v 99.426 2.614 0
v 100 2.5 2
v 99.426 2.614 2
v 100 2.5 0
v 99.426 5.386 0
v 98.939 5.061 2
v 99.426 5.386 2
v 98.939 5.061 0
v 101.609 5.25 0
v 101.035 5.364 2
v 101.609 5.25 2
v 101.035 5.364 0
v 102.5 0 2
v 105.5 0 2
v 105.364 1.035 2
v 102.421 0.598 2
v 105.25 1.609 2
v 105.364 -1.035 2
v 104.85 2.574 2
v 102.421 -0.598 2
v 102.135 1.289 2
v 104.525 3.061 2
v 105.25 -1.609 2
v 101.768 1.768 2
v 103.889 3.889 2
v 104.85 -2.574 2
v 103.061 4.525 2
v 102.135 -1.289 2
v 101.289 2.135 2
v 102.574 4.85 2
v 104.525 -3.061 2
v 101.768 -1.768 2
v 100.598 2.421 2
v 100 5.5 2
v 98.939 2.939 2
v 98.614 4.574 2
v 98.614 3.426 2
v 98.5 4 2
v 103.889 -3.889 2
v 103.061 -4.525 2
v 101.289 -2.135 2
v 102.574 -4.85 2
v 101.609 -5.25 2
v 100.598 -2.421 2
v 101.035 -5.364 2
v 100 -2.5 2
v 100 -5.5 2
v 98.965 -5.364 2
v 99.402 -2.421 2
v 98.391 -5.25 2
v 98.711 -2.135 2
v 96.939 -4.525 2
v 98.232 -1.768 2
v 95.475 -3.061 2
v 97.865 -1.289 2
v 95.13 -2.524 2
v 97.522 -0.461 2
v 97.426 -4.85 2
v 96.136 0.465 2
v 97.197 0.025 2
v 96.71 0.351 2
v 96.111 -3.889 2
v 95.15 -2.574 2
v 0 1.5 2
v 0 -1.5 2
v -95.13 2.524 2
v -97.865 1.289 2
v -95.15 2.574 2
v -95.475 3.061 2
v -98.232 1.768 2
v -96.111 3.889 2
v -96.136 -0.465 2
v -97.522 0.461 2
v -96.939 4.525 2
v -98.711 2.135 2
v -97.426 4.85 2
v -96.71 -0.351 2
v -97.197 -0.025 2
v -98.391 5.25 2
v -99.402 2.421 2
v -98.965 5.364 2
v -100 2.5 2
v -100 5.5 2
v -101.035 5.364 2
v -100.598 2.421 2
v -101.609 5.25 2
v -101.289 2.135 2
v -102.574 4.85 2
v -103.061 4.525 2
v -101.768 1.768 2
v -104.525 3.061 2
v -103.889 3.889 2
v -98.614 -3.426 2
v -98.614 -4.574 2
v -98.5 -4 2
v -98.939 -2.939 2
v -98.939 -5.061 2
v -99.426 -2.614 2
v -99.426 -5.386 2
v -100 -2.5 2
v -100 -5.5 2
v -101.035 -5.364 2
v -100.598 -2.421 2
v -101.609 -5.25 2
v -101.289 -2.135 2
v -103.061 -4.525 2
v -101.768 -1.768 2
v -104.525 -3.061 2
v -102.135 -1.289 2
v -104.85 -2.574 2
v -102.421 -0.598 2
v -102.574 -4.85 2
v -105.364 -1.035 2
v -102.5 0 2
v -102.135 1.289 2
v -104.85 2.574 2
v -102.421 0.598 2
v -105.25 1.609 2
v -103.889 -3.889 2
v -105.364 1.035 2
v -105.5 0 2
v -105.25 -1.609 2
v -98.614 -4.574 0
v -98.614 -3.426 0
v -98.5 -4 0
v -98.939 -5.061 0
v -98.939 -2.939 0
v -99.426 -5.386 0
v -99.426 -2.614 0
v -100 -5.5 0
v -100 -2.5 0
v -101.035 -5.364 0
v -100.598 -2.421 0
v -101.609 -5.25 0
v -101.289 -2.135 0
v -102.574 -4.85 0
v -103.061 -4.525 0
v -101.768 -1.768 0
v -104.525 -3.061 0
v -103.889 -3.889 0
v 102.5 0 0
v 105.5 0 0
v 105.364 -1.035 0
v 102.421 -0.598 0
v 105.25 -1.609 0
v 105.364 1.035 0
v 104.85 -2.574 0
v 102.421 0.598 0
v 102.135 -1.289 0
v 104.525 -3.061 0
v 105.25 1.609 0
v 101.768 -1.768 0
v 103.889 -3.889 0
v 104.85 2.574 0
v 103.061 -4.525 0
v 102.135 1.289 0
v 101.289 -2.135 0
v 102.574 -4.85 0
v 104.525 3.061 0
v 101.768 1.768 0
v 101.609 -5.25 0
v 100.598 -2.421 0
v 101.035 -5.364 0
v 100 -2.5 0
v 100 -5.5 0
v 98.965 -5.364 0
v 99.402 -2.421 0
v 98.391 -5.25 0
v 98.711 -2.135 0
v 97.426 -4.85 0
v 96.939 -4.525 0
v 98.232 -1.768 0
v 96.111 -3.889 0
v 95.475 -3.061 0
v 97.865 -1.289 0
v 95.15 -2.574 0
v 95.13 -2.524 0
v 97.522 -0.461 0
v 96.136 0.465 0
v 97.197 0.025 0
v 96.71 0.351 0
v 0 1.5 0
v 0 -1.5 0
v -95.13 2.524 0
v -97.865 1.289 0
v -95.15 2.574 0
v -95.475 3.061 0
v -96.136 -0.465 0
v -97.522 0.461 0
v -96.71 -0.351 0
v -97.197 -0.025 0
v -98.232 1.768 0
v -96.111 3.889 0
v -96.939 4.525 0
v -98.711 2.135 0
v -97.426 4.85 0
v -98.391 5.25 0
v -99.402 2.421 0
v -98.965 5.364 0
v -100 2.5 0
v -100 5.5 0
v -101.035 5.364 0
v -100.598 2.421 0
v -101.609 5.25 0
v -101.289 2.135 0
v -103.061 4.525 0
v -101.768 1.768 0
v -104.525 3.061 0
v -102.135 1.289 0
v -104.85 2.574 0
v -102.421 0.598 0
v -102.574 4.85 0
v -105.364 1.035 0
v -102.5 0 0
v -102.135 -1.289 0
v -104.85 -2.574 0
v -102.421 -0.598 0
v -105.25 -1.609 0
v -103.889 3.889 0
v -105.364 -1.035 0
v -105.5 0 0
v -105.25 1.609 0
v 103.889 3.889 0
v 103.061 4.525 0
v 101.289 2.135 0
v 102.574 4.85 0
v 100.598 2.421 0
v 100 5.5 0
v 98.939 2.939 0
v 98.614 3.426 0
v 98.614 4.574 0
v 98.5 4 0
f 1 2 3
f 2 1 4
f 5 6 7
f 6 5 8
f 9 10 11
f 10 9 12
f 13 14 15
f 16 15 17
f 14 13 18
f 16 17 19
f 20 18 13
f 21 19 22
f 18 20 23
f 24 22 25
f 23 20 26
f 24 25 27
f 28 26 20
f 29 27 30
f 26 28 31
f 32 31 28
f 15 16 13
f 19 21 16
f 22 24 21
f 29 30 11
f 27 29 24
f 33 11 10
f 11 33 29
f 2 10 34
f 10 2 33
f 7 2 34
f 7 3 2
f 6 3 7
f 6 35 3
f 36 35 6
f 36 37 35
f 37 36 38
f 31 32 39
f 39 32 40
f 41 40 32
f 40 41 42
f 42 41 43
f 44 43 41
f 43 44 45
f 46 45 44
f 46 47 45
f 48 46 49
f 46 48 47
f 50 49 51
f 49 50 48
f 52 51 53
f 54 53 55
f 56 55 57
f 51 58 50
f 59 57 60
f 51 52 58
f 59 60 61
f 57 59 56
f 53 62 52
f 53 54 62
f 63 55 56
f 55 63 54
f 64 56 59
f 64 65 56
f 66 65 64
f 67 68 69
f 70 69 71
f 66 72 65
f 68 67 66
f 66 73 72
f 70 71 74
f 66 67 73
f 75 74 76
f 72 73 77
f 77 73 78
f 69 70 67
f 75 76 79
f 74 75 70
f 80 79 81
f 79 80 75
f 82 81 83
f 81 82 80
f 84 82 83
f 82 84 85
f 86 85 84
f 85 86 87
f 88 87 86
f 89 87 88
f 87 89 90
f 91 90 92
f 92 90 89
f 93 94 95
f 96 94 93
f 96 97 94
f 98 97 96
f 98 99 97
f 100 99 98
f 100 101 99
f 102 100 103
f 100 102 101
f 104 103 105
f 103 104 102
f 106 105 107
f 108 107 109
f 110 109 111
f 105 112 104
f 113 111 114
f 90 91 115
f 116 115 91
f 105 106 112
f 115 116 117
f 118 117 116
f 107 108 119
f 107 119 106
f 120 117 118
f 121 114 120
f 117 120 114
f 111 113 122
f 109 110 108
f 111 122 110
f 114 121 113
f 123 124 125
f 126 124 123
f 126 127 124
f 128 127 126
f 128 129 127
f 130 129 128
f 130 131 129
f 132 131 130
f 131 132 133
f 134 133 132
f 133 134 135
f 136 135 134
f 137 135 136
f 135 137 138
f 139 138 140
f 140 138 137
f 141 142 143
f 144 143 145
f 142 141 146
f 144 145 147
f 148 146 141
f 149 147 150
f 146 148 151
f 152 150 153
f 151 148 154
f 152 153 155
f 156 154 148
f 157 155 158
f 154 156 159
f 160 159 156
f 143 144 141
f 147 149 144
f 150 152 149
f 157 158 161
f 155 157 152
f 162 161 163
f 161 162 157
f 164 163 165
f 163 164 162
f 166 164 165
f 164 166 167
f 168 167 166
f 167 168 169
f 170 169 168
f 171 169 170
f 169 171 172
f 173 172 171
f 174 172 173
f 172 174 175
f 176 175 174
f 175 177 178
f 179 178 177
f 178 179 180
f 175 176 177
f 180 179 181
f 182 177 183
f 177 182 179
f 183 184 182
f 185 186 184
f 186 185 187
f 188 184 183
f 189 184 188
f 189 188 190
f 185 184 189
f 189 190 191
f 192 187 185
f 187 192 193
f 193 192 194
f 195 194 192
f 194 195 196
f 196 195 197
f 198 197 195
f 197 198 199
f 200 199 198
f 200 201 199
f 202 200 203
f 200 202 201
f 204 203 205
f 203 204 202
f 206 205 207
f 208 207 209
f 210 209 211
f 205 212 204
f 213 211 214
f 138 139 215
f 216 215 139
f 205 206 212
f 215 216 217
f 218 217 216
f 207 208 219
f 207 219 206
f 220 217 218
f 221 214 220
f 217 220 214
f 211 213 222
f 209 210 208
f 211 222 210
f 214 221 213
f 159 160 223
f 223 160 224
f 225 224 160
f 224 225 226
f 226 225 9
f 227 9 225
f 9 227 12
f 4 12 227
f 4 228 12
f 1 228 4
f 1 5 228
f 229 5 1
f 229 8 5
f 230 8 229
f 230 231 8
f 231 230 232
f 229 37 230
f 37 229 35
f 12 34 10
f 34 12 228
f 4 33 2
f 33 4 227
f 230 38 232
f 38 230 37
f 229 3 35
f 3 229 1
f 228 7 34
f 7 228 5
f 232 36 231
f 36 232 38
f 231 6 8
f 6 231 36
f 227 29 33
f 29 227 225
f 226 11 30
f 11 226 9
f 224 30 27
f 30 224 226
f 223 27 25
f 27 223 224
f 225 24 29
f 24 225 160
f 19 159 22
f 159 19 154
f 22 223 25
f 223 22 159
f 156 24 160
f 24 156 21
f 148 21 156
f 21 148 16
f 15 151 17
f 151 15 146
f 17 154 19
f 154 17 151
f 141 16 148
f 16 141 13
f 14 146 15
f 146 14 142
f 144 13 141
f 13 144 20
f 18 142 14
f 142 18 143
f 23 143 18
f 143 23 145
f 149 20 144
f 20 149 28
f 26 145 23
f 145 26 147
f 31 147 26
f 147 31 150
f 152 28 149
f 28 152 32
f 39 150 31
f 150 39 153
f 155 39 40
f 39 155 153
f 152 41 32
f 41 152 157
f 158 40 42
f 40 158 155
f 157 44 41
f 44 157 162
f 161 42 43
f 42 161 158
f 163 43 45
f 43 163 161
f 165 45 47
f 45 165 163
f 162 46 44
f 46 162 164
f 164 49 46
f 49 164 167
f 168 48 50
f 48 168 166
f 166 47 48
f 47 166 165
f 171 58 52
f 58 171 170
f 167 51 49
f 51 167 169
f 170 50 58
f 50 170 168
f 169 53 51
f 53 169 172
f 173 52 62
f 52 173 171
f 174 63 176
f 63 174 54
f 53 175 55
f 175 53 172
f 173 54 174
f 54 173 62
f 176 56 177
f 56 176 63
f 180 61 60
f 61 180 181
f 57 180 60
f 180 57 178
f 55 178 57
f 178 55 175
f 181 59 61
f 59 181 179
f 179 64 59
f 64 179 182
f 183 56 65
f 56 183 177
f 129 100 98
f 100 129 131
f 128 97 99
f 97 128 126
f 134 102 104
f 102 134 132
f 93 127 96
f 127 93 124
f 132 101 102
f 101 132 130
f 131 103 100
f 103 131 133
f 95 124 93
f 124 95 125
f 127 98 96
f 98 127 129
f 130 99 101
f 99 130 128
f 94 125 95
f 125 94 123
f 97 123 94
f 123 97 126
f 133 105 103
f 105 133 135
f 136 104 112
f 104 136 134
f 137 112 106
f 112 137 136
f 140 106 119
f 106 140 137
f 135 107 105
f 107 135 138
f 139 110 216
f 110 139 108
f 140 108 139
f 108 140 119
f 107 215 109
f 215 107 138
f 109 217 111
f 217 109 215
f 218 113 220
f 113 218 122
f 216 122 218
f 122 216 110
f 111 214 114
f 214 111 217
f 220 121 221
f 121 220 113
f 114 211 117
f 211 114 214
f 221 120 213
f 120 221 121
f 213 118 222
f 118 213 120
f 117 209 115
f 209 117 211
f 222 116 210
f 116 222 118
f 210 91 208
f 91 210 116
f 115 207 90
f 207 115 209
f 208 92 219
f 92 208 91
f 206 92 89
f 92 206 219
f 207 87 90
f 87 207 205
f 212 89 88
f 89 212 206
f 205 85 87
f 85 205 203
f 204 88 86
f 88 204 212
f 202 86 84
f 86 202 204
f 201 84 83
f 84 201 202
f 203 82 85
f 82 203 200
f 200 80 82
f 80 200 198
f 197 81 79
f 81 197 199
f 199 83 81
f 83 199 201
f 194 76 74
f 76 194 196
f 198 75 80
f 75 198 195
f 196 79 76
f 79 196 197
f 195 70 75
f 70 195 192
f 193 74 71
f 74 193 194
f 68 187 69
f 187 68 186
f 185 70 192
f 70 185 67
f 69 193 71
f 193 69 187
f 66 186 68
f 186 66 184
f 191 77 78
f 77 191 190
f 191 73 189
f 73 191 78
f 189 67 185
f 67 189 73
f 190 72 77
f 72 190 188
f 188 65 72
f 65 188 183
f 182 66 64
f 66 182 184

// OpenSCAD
H=2;
D=3;
L=200;
HOOK_I_D=5;
HOOK_R=(HOOK_I_D+D)/2;

$fn=16;
//circle(d=D);

x0=[ for( a=[0:15:260] ) 
        [   L/2+sin(a)*HOOK_R,
            cos(a)*HOOK_R,
            0
        ]
    ];
    
function mirrorXY(v) = [-v[0],-v[1],v[2]];
f=mirrorXY(x0[0]);

x=  concat(
    x0,
    [0,0,0]
        );

for(r=[0:180:180])
    rotate(r)
        for (j = [0:len(x)-2] ) {
        hull() {
            translate(x[j+0])
                cylinder(d=D,h=H);
            translate(x[j+1])
                cylinder(d=D,h=H);
        }
    }
